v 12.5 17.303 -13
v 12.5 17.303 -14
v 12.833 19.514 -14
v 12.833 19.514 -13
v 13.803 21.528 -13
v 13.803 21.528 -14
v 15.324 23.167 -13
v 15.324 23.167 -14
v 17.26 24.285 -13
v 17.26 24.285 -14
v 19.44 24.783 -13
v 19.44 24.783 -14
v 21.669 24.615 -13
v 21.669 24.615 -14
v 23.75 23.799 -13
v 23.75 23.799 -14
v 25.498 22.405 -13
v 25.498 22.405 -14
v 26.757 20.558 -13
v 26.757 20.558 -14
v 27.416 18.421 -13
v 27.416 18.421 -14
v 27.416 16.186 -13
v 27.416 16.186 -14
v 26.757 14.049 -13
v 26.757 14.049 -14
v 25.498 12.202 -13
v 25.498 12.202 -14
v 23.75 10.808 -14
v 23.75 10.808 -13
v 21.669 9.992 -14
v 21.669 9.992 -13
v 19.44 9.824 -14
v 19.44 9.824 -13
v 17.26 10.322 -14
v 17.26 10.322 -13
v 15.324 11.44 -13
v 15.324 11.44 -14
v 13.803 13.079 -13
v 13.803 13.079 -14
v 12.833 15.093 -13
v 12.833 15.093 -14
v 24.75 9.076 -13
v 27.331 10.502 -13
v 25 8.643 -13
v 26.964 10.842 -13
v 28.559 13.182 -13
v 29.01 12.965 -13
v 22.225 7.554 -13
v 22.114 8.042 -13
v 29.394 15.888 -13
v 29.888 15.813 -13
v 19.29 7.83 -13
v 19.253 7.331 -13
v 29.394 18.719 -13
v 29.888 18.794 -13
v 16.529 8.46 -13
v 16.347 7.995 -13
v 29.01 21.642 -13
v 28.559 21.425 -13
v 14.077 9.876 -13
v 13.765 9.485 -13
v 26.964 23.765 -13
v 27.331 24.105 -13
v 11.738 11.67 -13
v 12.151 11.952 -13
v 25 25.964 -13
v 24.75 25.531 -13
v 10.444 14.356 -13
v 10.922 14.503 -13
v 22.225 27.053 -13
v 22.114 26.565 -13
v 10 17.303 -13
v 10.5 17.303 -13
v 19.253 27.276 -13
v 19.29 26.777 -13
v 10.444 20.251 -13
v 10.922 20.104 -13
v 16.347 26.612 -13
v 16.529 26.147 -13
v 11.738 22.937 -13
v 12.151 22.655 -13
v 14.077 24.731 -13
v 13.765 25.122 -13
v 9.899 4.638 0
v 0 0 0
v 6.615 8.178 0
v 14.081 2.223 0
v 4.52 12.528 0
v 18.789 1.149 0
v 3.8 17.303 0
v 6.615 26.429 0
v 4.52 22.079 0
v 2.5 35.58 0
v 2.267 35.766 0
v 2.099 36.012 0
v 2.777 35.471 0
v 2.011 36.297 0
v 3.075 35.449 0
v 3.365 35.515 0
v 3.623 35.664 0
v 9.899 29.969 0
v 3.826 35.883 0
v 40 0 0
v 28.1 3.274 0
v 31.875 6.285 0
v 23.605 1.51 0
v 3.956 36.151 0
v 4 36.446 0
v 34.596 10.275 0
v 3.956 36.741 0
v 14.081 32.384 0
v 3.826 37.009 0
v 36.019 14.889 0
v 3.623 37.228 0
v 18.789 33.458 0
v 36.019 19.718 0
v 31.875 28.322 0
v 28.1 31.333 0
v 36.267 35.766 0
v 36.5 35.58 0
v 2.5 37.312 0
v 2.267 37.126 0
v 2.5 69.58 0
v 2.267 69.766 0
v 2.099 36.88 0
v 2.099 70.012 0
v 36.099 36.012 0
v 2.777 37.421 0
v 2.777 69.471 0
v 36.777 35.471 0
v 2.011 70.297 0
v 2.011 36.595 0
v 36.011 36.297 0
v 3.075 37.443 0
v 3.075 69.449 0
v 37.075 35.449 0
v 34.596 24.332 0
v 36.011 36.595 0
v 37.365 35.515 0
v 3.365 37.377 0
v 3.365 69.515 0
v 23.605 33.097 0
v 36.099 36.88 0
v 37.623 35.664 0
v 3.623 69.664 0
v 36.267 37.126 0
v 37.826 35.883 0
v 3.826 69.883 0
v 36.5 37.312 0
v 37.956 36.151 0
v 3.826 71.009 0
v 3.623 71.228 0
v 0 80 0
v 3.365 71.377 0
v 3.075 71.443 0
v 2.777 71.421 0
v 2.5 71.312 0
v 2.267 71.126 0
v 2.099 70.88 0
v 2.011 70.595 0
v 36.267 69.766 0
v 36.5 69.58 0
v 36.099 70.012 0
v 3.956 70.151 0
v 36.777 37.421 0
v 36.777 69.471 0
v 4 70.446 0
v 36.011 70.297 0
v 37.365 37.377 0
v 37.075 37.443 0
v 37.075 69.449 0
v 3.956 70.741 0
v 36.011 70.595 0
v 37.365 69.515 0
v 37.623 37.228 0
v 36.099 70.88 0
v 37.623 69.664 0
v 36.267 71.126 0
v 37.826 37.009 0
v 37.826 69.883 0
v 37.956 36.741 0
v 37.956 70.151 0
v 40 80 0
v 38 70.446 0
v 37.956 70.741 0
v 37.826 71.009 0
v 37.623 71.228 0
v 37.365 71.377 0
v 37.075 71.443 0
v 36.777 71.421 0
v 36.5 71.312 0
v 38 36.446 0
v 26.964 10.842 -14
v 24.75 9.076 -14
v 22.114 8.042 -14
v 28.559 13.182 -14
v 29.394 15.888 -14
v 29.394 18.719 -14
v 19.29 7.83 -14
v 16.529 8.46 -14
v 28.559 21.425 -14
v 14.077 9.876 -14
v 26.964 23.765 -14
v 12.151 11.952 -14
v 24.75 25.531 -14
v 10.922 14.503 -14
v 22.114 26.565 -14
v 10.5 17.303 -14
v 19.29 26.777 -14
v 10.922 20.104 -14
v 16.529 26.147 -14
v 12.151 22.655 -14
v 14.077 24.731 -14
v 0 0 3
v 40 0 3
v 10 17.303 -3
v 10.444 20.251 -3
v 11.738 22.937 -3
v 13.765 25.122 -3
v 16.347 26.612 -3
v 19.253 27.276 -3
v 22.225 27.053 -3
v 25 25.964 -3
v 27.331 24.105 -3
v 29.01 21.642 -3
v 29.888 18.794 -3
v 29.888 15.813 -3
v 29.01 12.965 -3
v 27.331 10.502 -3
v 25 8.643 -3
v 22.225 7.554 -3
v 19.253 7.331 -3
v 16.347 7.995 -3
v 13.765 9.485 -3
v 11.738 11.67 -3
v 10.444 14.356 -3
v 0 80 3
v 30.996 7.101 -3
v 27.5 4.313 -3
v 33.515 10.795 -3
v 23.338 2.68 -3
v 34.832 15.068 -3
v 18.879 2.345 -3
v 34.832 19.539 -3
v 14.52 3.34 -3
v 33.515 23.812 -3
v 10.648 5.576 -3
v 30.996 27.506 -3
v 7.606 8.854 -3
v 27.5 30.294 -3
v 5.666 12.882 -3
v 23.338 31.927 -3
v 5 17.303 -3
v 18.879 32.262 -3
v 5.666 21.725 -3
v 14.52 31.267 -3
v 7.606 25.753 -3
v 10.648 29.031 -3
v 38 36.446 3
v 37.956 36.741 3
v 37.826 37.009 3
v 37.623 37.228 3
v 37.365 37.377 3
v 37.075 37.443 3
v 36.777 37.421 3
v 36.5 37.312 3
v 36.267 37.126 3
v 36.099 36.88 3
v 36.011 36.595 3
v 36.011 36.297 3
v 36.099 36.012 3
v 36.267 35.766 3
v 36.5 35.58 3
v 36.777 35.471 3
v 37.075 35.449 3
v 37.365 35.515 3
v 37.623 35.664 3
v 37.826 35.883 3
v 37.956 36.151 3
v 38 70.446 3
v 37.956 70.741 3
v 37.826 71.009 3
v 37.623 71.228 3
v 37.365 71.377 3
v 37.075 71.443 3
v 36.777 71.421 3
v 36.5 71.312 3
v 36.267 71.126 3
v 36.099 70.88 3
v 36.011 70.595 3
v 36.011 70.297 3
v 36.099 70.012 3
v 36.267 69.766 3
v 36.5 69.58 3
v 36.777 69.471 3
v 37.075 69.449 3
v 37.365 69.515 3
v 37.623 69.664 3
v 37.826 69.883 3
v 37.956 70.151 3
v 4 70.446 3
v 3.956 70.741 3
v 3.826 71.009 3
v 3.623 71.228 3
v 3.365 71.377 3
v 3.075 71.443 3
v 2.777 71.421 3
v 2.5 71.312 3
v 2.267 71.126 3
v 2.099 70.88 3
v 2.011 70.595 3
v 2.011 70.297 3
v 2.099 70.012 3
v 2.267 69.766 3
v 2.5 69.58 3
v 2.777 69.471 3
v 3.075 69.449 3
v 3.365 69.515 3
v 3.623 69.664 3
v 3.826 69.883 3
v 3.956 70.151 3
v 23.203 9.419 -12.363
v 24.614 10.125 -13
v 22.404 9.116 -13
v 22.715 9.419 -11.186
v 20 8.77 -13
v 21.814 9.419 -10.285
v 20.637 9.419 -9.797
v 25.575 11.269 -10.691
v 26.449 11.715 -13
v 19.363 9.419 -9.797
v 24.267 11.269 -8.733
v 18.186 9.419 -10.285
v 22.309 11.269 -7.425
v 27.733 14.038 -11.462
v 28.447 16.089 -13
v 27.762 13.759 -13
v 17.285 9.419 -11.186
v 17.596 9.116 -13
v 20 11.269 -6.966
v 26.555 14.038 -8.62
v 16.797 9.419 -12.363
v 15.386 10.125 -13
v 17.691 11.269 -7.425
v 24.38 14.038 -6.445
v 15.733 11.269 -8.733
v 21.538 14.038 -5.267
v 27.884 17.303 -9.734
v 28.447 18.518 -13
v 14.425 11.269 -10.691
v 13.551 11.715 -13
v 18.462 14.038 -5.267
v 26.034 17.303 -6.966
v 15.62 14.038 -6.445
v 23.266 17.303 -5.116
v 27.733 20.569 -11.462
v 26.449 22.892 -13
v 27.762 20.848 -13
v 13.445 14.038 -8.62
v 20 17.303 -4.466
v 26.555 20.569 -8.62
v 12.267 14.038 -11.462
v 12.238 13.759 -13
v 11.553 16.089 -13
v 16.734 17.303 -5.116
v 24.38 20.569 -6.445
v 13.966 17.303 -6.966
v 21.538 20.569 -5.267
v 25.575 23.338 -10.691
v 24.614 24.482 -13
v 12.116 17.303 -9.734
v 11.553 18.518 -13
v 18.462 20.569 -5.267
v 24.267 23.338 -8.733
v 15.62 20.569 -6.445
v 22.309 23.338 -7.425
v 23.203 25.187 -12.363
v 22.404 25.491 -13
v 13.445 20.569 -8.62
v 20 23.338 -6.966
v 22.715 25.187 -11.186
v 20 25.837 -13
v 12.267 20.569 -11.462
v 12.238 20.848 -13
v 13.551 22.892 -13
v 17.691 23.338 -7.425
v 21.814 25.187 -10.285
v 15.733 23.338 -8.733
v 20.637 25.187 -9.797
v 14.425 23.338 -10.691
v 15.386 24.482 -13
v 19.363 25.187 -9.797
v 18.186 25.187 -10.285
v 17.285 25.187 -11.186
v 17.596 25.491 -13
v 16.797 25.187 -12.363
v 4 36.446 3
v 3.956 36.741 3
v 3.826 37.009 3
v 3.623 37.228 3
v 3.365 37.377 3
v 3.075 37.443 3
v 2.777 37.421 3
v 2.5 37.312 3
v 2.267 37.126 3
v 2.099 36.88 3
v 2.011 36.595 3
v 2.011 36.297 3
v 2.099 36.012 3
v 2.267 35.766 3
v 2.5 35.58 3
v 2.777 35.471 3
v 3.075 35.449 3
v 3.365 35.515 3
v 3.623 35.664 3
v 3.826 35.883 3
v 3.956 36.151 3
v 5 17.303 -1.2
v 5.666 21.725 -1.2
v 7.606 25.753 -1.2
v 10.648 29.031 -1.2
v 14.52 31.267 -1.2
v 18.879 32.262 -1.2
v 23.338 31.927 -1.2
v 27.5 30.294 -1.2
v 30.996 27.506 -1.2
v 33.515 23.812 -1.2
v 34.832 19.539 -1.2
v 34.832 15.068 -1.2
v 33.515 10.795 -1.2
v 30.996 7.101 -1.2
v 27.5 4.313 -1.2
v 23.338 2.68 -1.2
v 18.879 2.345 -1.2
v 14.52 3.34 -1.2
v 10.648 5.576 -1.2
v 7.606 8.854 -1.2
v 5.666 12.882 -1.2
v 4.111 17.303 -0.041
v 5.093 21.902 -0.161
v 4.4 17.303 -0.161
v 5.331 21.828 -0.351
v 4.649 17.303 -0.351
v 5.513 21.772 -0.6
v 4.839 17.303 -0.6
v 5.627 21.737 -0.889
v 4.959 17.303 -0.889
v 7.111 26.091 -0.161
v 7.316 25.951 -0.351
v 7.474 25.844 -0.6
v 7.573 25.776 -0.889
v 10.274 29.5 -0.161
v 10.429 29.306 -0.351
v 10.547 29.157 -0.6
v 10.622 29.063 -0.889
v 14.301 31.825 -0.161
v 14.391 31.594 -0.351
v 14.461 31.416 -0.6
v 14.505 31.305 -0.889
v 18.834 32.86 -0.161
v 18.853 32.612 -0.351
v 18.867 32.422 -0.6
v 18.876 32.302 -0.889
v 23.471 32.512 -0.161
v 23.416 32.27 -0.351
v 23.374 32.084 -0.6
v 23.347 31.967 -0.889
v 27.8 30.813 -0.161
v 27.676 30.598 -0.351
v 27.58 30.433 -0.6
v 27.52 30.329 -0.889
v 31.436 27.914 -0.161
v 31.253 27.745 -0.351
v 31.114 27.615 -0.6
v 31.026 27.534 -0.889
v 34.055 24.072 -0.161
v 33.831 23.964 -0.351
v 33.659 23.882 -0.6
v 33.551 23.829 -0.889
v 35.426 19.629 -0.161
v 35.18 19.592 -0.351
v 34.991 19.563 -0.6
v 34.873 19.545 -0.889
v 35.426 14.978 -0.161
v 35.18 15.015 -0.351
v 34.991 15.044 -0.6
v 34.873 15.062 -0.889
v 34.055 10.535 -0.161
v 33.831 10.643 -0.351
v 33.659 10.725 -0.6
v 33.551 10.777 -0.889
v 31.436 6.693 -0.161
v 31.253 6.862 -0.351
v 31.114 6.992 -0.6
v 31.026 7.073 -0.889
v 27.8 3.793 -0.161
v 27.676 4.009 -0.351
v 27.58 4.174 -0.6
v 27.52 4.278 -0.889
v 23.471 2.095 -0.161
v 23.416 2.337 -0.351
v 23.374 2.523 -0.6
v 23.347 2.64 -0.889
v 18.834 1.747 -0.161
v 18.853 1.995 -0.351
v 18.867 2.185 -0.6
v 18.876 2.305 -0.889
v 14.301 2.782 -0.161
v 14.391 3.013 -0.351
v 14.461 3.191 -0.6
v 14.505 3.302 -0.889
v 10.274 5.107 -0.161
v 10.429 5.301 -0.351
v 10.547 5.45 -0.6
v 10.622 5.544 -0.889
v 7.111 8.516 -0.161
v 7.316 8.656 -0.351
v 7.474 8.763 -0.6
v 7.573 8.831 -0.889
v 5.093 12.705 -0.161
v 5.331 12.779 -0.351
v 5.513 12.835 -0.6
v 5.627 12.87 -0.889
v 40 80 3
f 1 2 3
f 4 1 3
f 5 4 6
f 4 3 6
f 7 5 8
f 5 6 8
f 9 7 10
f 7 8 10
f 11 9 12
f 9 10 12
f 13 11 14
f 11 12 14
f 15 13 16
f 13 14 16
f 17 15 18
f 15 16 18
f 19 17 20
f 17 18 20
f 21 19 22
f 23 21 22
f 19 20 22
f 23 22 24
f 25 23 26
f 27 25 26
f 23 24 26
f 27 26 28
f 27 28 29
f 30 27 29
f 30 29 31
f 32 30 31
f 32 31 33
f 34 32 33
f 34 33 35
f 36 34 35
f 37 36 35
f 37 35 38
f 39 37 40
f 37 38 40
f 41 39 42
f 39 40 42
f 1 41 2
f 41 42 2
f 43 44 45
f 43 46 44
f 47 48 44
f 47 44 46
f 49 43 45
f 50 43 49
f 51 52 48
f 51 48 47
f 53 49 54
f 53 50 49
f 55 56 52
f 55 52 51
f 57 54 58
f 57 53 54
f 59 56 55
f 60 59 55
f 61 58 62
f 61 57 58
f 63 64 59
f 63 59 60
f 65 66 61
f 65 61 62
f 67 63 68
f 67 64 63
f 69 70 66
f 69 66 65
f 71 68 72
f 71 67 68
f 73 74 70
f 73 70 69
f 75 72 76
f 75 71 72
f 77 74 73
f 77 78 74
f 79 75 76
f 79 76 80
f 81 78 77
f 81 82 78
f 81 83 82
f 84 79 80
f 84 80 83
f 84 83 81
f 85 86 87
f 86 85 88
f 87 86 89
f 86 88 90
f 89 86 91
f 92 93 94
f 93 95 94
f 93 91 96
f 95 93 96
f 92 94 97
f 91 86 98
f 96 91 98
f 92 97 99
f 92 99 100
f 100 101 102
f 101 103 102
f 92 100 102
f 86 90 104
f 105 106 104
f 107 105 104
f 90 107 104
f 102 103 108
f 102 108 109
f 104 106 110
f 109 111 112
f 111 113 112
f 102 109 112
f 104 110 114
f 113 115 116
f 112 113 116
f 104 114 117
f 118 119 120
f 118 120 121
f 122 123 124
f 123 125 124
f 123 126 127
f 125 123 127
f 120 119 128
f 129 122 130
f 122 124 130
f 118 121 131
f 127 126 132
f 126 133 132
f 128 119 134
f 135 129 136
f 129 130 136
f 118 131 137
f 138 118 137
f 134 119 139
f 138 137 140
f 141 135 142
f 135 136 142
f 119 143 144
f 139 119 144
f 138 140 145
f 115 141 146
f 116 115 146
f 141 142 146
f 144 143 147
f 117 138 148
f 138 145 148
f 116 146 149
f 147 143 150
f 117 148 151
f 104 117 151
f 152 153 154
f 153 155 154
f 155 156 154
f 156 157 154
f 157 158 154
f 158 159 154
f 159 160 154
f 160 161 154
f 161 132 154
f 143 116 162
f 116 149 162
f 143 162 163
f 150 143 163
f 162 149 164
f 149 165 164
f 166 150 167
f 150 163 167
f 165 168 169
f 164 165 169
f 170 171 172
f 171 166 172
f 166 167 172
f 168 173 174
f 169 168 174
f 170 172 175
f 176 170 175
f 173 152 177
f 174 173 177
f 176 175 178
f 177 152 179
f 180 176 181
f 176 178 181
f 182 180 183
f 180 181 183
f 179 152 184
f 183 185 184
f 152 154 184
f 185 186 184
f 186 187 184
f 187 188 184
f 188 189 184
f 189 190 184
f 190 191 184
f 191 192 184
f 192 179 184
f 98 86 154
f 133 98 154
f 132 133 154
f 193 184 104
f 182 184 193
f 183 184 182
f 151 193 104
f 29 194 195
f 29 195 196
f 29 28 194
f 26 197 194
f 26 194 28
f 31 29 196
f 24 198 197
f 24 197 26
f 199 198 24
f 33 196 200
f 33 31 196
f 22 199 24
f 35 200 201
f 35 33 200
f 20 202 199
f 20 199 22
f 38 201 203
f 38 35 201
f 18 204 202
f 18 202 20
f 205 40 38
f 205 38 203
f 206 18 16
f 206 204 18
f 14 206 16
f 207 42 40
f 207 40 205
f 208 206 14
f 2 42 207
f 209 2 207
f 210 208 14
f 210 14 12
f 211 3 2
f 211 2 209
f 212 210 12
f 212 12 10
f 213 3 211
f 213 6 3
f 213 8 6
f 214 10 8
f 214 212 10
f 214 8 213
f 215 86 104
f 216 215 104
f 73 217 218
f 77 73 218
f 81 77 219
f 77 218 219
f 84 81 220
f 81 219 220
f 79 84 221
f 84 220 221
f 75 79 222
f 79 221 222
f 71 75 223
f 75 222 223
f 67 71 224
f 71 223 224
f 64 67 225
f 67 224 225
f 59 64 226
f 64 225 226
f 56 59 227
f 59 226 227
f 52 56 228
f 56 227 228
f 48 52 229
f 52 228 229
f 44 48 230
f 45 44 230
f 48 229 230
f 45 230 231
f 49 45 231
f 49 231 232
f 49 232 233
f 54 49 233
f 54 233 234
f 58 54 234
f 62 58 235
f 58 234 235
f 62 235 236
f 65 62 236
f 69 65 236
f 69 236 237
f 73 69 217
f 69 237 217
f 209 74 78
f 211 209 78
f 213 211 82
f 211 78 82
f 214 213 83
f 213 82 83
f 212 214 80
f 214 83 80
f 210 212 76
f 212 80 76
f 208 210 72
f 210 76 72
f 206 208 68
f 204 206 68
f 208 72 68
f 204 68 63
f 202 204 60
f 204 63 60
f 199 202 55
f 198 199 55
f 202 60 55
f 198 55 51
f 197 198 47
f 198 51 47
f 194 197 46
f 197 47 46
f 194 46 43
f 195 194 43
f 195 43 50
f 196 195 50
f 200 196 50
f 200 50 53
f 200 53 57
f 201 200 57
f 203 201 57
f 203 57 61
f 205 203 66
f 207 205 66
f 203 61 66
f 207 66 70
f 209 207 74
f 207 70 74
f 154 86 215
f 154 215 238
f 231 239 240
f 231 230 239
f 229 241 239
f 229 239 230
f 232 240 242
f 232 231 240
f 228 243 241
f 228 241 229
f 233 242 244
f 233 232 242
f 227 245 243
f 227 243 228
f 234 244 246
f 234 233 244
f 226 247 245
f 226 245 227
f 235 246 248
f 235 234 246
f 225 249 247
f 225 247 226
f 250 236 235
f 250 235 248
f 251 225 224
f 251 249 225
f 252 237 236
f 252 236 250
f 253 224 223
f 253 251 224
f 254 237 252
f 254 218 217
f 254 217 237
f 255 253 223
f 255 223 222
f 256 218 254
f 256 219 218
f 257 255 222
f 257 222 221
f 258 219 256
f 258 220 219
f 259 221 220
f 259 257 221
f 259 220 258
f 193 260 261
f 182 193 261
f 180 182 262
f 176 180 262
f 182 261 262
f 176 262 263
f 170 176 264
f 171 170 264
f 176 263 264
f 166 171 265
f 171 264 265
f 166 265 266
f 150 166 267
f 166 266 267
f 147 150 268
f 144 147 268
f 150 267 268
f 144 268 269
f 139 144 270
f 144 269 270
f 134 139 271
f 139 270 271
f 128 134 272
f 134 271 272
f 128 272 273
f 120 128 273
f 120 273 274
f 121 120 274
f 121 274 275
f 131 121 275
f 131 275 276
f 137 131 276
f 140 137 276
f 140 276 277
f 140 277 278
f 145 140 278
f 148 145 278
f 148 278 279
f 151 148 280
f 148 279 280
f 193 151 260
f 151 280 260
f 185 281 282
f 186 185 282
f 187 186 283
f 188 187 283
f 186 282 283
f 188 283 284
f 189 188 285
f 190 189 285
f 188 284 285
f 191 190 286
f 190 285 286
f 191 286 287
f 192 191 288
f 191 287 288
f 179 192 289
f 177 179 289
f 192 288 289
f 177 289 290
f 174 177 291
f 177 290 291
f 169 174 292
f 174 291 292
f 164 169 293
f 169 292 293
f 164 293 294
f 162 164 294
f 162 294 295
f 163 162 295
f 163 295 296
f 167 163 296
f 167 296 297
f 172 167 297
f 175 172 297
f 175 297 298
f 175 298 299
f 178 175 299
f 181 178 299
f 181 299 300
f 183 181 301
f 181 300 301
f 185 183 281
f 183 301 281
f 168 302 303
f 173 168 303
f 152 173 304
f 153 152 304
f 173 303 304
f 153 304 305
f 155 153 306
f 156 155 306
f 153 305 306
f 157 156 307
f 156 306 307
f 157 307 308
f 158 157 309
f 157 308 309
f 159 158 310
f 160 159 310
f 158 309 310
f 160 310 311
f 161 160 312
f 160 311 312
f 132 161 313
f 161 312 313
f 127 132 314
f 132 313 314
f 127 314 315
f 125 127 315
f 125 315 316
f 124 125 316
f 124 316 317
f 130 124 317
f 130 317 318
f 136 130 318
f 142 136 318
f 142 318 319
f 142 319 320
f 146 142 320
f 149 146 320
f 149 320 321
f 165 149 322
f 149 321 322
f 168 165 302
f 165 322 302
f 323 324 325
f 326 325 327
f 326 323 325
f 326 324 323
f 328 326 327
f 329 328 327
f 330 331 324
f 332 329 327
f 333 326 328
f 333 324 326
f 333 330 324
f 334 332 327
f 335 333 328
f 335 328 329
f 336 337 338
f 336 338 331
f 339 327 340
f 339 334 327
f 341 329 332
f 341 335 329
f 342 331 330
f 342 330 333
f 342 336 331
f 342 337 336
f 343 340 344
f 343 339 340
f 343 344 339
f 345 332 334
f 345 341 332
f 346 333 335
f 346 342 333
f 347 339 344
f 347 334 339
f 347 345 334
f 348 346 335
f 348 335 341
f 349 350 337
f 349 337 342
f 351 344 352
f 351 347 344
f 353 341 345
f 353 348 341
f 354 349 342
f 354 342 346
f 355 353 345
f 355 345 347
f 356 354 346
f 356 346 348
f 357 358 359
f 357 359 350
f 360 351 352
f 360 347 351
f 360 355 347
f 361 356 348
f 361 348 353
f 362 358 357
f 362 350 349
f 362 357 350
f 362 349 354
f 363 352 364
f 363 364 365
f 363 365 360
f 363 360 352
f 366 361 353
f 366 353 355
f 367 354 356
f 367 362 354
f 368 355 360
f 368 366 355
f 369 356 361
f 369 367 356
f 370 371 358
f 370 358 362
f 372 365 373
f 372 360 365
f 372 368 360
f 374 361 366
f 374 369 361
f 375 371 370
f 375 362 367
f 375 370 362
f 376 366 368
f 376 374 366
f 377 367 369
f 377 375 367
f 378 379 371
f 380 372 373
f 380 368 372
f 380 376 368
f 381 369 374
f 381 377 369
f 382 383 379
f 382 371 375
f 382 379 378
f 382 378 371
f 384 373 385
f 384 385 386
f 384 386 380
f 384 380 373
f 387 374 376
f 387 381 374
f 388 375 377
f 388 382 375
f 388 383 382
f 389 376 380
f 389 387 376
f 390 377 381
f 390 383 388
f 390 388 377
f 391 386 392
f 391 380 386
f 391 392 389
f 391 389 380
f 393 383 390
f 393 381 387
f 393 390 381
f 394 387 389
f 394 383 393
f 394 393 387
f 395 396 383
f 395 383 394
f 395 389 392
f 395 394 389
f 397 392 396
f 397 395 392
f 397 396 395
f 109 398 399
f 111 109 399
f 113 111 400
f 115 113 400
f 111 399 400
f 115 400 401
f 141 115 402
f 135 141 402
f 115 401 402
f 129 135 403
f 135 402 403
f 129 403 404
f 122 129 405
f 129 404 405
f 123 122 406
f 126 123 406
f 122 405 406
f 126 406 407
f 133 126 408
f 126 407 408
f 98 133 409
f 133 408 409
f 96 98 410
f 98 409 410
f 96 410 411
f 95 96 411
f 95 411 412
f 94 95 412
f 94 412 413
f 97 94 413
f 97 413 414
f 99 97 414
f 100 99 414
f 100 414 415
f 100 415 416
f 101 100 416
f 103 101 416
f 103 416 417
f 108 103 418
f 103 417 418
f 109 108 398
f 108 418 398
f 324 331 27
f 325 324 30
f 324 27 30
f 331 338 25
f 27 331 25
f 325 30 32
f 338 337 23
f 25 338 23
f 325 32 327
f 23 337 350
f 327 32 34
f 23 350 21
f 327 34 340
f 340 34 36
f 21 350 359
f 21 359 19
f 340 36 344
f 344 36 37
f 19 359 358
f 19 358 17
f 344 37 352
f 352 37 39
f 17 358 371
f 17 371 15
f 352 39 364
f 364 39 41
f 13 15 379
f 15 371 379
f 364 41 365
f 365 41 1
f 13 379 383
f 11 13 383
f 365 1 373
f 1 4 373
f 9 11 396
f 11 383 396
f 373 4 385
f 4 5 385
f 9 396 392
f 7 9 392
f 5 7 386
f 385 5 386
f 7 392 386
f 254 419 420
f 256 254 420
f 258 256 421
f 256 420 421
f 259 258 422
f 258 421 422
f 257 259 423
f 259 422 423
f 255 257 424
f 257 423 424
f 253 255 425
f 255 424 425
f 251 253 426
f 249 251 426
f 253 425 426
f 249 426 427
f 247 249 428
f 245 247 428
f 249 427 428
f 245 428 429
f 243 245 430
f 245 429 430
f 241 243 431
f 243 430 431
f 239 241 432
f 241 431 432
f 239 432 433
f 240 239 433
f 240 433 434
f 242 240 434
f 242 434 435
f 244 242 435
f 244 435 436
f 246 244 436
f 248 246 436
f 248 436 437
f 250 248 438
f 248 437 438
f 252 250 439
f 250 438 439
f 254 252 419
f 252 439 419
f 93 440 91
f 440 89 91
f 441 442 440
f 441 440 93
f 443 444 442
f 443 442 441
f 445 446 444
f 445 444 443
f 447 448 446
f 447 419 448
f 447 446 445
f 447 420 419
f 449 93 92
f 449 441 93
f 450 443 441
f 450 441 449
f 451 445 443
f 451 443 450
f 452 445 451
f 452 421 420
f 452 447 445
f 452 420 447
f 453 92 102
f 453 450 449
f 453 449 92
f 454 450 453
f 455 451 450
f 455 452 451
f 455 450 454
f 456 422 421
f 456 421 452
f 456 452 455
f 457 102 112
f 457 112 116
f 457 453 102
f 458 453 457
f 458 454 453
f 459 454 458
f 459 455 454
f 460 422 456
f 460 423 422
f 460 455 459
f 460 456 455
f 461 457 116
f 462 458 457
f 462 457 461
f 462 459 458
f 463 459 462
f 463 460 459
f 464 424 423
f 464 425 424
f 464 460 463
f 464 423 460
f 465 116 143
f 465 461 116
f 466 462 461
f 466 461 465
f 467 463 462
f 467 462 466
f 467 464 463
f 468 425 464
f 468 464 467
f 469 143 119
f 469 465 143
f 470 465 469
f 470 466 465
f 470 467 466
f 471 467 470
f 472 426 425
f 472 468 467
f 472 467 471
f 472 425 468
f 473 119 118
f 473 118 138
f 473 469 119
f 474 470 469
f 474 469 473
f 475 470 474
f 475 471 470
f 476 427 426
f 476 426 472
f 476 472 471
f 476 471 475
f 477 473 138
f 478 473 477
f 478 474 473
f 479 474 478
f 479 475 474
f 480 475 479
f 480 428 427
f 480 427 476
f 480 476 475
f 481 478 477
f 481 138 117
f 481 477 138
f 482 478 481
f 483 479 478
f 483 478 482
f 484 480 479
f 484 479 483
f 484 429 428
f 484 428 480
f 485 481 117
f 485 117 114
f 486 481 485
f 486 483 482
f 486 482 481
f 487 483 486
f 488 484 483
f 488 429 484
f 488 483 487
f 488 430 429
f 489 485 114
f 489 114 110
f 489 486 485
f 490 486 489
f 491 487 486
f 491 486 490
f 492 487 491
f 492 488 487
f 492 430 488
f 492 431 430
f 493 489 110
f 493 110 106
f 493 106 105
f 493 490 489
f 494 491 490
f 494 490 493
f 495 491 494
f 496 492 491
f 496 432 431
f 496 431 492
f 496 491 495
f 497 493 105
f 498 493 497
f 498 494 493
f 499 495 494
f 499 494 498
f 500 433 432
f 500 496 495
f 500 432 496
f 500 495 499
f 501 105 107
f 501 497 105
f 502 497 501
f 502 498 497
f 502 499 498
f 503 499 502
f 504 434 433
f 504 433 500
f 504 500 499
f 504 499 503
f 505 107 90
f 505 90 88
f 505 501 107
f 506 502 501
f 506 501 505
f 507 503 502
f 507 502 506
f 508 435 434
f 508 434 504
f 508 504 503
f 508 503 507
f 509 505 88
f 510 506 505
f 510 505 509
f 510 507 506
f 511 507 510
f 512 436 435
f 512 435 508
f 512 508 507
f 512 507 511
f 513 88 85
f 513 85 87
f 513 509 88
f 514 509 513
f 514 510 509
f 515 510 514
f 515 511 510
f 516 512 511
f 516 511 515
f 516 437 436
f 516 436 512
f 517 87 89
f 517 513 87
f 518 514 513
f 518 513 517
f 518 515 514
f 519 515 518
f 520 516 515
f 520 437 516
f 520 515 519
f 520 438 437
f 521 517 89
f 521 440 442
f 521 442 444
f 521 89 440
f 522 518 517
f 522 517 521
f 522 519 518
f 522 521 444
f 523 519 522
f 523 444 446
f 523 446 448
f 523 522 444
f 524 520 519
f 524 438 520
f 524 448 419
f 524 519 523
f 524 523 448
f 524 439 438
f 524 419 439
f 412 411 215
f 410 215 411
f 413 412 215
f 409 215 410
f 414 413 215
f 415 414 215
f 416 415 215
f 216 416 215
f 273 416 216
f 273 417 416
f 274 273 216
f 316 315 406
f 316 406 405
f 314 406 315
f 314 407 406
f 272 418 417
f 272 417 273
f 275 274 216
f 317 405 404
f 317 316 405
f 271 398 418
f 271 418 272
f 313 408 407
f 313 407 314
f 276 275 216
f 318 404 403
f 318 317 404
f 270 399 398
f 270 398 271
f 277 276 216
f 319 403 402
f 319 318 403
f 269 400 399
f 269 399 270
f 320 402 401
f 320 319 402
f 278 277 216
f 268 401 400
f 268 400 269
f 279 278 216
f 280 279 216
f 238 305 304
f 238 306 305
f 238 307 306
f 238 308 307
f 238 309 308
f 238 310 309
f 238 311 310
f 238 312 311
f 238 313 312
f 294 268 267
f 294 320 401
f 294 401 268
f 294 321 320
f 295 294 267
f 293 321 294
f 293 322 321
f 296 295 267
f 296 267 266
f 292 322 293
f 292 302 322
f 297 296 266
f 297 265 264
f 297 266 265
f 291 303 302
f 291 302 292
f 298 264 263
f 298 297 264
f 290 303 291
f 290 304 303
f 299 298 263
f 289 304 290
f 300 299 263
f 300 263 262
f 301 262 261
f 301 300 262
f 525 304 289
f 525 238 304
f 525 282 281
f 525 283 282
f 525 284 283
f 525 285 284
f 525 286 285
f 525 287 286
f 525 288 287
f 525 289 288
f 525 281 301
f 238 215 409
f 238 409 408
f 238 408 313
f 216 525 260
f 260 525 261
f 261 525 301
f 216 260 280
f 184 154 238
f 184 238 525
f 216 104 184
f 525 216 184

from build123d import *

# Parameters (mm, degrees)
SKETCH1_W           = 40
SKETCH1_H           = 80
BOSS_EXTRUDE1_DEPTH = 3
SKETCH2_R           = 1
CUT_EXTRUDE1_DEPTH  = 3
SKETCH3_R           = 15
BOSS_EXTRUDE2_DEPTH = 3
FILLET1_R           = 1.2
SKETCH4_R           = 10
BOSS_EXTRUDE3_DEPTH = 10
SKETCH14_R          = 9.5
BOSS_EXTRUDE4_DEPTH = 1
SKETCH15_R          = 7.5
CUT_EXTRUDE7_DEPTH  = 1


with BuildPart() as part:
    # Sketch1 → Boss-Extrude1 (new body)
    with BuildSketch(Plane.XY):
        with Locations((20, 40)):
            Rectangle(SKETCH1_W, SKETCH1_H)
    extrude(amount=BOSS_EXTRUDE1_DEPTH)

    # Sketch2 → Cut-Extrude1 (cut)
    with BuildSketch(Plane.XY.offset(3)):
        with Locations((3, 70.446149139)):
            Circle(SKETCH2_R)
        with Locations((3, 36.446149139)):
            Circle(SKETCH2_R)
        with Locations((37, 70.446149139)):
            Circle(SKETCH2_R)
        with Locations((37, 36.446149139)):
            Circle(SKETCH2_R)
    extrude(amount=-CUT_EXTRUDE1_DEPTH, mode=Mode.SUBTRACT)

    # Sketch3 → Boss-Extrude2 (add)
    with BuildSketch(Plane(origin=(0, 0, 0), x_dir=(-1, 0, 0), z_dir=(0, 0, -1))):
        with Locations((-20, 17.303489874)):
            Circle(SKETCH3_R)
    extrude(amount=BOSS_EXTRUDE2_DEPTH)

    # Fillet1
    fillet1_edges = [part.edges().sort_by_distance(p)[0] for p in [
        (35, 17.303489874, 0),
    ]]
    fillet(fillet1_edges, radius=FILLET1_R)

    # Sketch4 → Boss-Extrude3 (add)
    with BuildSketch(Plane(origin=(0, 0, -3), x_dir=(-1, 0, 0), z_dir=(0, 0, -1))):
        with Locations((-20, 17.303489874)):
            Circle(SKETCH4_R)
    extrude(amount=BOSS_EXTRUDE3_DEPTH)

    # Sketch10 → Cut-Revolve2 (revolve, cut)
    with BuildSketch(Plane(origin=(0, 0, -13), x_dir=(-1, 0, 0), z_dir=(0, 0, -1))):
        with BuildLine():
            Line((-20, 25.837066369), (-20, 8.769913378))
            ThreePointArc((-20, 8.769913378), (-11.466423505, 17.303489874), (-20, 25.837066369))
        make_face()
    revolve(axis=Axis((20, 25.837066369, -13), (0, -1, 0)), mode=Mode.SUBTRACT)

    # Sketch14 → Boss-Extrude4 (add)
    with BuildSketch(Plane(origin=(0, 0, -13), x_dir=(-1, 0, 0), z_dir=(0, 0, -1))):
        with Locations((-20, 17.303489874)):
            Circle(SKETCH14_R)
    extrude(amount=BOSS_EXTRUDE4_DEPTH)

    # Sketch15 → Cut-Extrude7 (cut)
    with BuildSketch(Plane(origin=(0, 0, -14), x_dir=(-1, 0, 0), z_dir=(0, 0, -1))):
        with Locations((-20, 17.303489874)):
            Circle(SKETCH15_R)
    extrude(amount=-CUT_EXTRUDE7_DEPTH, mode=Mode.SUBTRACT)


solid = part.part
